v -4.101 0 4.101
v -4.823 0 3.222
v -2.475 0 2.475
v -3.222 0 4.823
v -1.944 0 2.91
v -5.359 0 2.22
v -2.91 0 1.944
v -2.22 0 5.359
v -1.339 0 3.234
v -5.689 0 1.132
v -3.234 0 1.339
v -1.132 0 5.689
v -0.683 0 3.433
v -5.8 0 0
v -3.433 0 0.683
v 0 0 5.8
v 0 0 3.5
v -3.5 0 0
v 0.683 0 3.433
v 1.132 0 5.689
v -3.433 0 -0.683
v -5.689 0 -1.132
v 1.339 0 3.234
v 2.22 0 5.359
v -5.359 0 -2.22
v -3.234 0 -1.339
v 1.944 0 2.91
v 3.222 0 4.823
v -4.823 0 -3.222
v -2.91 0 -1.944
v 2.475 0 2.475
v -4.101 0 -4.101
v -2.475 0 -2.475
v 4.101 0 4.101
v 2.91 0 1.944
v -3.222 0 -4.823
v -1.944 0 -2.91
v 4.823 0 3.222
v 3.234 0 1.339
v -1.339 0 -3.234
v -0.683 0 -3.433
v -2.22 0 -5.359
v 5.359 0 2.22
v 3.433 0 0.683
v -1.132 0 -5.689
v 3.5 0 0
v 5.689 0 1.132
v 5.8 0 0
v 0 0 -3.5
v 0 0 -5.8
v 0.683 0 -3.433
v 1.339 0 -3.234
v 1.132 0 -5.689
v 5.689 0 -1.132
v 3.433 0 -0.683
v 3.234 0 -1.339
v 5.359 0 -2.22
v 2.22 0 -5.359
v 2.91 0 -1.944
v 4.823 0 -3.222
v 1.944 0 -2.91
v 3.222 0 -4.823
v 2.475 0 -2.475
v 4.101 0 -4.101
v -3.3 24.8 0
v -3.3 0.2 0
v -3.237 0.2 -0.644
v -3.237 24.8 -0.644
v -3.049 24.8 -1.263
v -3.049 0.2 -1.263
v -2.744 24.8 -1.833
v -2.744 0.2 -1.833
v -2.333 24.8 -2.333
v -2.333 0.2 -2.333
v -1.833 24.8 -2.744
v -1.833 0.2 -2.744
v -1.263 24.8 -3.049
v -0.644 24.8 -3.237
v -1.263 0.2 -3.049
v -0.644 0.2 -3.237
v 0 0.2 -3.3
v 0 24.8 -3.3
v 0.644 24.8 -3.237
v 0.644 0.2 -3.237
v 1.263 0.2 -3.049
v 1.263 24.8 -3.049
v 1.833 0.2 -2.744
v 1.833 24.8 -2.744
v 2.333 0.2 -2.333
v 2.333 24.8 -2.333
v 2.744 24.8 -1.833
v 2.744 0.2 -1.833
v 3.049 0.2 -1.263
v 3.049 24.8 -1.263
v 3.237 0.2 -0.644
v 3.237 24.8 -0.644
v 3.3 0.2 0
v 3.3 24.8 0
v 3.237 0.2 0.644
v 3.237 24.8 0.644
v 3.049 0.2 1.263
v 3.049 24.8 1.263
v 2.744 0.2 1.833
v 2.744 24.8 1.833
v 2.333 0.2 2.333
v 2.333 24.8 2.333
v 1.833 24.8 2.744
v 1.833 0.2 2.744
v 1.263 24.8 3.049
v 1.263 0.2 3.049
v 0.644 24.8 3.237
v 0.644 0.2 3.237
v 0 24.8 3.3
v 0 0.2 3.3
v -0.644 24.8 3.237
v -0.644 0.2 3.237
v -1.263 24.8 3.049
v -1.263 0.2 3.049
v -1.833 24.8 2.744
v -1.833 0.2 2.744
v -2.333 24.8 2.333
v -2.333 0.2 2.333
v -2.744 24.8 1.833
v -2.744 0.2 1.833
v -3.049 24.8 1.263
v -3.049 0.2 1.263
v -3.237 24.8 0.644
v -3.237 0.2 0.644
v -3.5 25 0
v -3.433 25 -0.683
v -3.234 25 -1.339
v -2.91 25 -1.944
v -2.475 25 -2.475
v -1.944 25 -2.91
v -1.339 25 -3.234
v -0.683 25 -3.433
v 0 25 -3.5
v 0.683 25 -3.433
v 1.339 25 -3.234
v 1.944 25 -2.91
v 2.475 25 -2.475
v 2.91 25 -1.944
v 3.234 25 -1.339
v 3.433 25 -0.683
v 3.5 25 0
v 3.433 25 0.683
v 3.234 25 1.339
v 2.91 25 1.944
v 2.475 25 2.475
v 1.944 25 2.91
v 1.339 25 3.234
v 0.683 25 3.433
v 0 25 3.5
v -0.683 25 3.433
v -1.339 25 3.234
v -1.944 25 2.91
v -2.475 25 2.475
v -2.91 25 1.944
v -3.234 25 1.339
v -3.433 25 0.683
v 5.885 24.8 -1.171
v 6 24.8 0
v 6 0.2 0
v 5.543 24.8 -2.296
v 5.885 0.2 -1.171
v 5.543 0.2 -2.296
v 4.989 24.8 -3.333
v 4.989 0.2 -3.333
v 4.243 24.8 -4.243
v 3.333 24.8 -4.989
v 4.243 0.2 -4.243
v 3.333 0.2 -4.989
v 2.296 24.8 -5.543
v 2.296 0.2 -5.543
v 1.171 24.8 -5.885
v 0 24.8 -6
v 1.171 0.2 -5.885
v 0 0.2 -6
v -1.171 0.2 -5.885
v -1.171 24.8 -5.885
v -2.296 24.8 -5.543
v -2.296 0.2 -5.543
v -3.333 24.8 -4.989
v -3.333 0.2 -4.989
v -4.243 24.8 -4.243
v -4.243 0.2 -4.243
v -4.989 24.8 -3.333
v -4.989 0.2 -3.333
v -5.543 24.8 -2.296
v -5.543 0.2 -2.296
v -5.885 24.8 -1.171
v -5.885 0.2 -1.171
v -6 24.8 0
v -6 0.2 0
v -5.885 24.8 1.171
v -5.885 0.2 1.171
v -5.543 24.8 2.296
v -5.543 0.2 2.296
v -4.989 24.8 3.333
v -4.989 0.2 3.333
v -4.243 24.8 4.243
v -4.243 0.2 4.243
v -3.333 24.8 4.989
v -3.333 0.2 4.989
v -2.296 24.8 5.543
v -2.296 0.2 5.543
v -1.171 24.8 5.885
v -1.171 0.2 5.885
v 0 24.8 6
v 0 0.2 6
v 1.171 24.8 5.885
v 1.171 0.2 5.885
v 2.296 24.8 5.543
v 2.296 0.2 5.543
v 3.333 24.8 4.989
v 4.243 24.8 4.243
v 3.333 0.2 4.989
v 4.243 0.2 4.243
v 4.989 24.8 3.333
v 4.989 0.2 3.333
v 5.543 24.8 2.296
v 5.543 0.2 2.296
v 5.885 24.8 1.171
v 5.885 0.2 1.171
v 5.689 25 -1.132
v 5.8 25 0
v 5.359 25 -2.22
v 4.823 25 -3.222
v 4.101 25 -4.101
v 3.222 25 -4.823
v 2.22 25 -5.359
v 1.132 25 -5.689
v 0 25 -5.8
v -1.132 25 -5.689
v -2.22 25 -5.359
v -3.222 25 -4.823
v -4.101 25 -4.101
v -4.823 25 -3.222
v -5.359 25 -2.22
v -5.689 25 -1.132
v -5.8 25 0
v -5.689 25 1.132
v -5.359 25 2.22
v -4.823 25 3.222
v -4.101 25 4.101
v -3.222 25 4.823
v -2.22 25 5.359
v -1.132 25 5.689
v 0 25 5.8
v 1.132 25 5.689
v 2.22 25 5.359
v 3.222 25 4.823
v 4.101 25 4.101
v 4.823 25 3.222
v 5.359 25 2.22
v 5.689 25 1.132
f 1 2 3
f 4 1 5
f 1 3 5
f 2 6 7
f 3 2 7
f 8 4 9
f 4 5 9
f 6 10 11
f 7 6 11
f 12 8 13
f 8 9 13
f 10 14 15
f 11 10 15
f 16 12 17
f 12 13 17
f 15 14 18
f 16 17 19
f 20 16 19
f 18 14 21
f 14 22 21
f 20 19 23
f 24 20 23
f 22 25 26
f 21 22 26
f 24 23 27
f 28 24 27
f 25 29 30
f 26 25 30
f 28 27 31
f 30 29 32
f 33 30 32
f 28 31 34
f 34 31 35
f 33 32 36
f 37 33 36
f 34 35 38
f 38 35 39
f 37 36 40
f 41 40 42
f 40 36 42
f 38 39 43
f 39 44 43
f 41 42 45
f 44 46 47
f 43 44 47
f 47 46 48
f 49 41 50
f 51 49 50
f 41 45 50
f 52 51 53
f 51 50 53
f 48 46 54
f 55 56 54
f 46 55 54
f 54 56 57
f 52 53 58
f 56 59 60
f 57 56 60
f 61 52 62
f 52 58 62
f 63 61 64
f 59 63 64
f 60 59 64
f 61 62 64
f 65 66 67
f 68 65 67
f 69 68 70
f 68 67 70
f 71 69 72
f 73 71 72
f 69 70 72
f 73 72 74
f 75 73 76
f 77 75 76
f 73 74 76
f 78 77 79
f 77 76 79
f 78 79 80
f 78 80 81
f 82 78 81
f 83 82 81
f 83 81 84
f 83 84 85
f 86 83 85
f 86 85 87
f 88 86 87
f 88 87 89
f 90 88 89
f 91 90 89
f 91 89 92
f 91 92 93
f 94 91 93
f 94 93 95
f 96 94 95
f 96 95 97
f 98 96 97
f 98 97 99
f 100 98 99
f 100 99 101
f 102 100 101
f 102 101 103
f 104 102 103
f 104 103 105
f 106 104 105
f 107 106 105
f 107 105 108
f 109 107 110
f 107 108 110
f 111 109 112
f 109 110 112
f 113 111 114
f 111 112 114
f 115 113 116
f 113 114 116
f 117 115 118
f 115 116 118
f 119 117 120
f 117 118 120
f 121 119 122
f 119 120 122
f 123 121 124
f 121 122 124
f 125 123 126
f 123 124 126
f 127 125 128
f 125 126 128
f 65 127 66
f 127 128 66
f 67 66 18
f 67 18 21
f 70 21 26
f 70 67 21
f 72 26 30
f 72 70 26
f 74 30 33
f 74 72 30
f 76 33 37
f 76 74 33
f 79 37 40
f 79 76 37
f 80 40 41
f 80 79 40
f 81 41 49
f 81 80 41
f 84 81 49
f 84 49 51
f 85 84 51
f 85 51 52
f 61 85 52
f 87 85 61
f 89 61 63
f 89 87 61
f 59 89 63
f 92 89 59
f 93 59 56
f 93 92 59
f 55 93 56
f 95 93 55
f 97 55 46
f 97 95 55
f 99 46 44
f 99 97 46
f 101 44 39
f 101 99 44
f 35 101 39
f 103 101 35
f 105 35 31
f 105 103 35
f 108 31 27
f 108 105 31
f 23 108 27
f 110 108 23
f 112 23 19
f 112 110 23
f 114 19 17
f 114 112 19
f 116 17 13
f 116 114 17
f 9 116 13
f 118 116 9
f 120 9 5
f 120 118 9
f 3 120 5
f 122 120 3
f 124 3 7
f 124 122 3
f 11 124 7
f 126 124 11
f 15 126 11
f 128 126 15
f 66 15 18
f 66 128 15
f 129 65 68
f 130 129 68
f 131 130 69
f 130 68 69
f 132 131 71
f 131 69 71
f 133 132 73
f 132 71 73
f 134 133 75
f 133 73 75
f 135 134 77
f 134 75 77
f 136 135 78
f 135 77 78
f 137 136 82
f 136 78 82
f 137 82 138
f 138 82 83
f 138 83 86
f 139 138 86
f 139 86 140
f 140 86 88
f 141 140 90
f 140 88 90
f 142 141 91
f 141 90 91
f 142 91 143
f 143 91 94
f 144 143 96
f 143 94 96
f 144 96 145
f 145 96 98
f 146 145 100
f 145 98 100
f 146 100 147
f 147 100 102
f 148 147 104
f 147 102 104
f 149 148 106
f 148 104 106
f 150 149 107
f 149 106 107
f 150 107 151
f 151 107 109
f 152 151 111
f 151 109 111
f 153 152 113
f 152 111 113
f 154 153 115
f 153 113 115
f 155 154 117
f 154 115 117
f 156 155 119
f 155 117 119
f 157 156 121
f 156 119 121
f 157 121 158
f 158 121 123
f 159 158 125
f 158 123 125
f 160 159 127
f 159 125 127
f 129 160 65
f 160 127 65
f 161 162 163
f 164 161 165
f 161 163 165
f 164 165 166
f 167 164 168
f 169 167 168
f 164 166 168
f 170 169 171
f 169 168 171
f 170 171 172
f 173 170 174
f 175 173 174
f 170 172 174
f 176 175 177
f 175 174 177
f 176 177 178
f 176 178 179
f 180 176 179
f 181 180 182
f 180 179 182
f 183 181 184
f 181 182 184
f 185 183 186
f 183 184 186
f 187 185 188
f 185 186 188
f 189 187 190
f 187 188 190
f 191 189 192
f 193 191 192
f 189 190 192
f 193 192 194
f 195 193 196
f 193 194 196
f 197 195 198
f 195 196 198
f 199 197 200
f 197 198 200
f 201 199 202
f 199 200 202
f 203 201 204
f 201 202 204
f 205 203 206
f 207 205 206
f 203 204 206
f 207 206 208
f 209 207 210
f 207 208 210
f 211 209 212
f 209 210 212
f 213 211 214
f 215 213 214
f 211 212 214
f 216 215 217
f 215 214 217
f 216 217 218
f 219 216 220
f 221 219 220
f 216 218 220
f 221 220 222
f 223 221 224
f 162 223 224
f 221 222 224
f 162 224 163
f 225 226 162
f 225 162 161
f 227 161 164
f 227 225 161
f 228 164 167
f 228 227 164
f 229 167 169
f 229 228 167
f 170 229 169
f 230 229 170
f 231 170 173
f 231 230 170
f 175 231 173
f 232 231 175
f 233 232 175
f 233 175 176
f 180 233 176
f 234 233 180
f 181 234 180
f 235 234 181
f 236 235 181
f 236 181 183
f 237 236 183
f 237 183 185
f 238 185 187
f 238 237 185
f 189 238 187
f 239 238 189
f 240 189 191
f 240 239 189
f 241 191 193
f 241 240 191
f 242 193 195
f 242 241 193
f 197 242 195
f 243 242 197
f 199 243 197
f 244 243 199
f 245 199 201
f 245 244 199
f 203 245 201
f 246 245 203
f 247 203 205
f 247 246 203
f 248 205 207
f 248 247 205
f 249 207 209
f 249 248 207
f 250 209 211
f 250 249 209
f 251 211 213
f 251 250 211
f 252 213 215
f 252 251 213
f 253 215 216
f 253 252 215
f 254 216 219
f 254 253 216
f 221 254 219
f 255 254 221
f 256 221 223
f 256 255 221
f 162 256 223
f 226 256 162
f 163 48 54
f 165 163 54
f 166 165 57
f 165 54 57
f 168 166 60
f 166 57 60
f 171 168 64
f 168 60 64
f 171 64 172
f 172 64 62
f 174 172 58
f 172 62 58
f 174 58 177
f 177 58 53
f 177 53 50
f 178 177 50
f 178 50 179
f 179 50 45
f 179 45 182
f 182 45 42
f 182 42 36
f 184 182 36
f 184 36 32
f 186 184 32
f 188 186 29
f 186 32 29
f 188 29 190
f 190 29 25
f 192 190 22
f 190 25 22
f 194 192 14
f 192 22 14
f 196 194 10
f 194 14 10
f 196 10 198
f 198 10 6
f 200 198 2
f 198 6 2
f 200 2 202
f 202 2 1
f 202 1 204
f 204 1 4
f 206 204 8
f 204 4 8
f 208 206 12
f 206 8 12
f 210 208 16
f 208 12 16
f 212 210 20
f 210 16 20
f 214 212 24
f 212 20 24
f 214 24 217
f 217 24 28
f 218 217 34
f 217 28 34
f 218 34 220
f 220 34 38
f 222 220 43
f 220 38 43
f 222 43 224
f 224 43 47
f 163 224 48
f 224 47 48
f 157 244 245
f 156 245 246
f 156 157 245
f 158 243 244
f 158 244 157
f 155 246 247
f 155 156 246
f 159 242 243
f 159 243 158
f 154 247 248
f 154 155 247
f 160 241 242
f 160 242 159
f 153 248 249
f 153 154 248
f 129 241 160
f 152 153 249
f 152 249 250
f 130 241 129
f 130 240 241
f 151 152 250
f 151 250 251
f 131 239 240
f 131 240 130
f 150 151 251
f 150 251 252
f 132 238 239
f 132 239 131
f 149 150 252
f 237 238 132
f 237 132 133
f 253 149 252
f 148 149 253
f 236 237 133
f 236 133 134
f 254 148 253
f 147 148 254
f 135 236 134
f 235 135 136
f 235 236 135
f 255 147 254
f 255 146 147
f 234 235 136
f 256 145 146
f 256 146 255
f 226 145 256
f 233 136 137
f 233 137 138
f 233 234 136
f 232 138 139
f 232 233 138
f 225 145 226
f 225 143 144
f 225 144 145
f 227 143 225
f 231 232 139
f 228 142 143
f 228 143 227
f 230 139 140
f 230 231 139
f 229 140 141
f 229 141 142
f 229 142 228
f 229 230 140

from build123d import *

# Parameters (mm, degrees)
SKETCH1_R            = 6
BOSS_EXTRUDE1_DEPTH  = 25
M6_CLEARANCE_HOLE1_D = 6.6
CHAMFER1_SIZE        = 0.2


with BuildPart() as part:
    # Sketch1 → Boss-Extrude1 (new body)
    with BuildSketch(Plane(origin=(0, 0, 0), x_dir=(1, 0, 0), z_dir=(0, 1, 0))):
        Circle(SKETCH1_R)
    extrude(amount=BOSS_EXTRUDE1_DEPTH)

    # M6 Clearance Hole1 (through all)
    with Locations(Plane(origin=(0, 25, 0), x_dir=(1, 0, 0), z_dir=(0, 1, 0))):
        with Locations((0, 0)):
            Hole(M6_CLEARANCE_HOLE1_D / 2)

    # Chamfer1
    chamfer1_edges = [part.edges().sort_by_distance(p)[0] for p in [
        (-6, 0, 0),
        (-6, 25, 0),
        (3.3, 25, 0),
        (3.3, 0, 0),
    ]]
    chamfer(chamfer1_edges, length=CHAMFER1_SIZE)


solid = part.part
